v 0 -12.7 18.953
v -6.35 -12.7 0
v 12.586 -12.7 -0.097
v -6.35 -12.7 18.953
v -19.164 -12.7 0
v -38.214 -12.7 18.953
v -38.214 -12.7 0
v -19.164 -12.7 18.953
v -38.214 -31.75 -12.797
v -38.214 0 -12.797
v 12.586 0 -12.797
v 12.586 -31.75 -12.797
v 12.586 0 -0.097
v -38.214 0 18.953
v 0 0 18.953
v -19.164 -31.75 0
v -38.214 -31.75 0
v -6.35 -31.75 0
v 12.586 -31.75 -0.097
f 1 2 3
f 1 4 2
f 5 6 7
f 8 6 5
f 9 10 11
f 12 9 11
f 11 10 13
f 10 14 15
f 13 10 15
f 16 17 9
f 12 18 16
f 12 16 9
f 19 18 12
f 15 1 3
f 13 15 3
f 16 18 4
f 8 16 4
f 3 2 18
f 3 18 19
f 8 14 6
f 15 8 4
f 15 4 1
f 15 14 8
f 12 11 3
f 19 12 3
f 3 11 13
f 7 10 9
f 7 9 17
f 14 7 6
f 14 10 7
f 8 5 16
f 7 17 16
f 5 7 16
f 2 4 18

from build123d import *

# Parameters (mm, degrees)
F0_W      = 50.8
F0_H      = 31.75
F1_DEPTH  = 31.75
F3_DEPTH  = 31.75
F5_DEPTH  = 19.05
F6_W      = 19.05
F6_H      = 18.953177
F7_DEPTH  = 19.05
F9_DEPTH  = 12.7
F11_DEPTH = 25.4


with BuildPart() as f1:
    # F0 (on Front) → F1 (new body)
    with BuildSketch(Plane.XZ):
        with Locations((-12.814426, 3.078177)):
            Rectangle(F0_W, F0_H)
    extrude(amount=F1_DEPTH)

    # F2 (on face) → F3 (cut)
    with BuildSketch(Plane.XZ.offset(31.75)):
        Polygon((12.585574, -0.096823), (12.585574, 18.953177), (0, 18.953177), align=None)
    extrude(amount=-F3_DEPTH, mode=Mode.SUBTRACT)

    # F4 (on face) → F5 (cut)
    with BuildSketch(Plane.XZ.offset(31.75)):
        Polygon((-6.35, 0), (12.585574, -0.096823), (0, 18.953177), (-6.35, 18.953177), align=None)
    extrude(amount=-F5_DEPTH, mode=Mode.SUBTRACT)

    # F6 (on face) → F7 (cut)
    with BuildSketch(Plane.XZ.offset(31.75)):
        with Locations((-28.689426, 9.476589)):
            Rectangle(F6_W, F6_H)
    extrude(amount=-F7_DEPTH, mode=Mode.SUBTRACT)

    # F8 (on face) → F9 (cut)
    with BuildSketch(Plane.YZ.offset(-6.35)):
        Polygon((-31.75, 0), (-12.7, 18.953177), (-31.75, 18.953177), align=None)
    extrude(amount=-F9_DEPTH, mode=Mode.SUBTRACT)

    # F10 (on face) → F11 (cut)
    with BuildSketch(Plane(origin=(-19.164426, 0, 0), x_dir=(0, -1, 0), z_dir=(-1, 0, 0))):
        Polygon((31.75, 18.953177), (12.7, 18.953177), (31.75, 0), align=None)
    extrude(amount=-F11_DEPTH, mode=Mode.SUBTRACT)


solid = f1.part
